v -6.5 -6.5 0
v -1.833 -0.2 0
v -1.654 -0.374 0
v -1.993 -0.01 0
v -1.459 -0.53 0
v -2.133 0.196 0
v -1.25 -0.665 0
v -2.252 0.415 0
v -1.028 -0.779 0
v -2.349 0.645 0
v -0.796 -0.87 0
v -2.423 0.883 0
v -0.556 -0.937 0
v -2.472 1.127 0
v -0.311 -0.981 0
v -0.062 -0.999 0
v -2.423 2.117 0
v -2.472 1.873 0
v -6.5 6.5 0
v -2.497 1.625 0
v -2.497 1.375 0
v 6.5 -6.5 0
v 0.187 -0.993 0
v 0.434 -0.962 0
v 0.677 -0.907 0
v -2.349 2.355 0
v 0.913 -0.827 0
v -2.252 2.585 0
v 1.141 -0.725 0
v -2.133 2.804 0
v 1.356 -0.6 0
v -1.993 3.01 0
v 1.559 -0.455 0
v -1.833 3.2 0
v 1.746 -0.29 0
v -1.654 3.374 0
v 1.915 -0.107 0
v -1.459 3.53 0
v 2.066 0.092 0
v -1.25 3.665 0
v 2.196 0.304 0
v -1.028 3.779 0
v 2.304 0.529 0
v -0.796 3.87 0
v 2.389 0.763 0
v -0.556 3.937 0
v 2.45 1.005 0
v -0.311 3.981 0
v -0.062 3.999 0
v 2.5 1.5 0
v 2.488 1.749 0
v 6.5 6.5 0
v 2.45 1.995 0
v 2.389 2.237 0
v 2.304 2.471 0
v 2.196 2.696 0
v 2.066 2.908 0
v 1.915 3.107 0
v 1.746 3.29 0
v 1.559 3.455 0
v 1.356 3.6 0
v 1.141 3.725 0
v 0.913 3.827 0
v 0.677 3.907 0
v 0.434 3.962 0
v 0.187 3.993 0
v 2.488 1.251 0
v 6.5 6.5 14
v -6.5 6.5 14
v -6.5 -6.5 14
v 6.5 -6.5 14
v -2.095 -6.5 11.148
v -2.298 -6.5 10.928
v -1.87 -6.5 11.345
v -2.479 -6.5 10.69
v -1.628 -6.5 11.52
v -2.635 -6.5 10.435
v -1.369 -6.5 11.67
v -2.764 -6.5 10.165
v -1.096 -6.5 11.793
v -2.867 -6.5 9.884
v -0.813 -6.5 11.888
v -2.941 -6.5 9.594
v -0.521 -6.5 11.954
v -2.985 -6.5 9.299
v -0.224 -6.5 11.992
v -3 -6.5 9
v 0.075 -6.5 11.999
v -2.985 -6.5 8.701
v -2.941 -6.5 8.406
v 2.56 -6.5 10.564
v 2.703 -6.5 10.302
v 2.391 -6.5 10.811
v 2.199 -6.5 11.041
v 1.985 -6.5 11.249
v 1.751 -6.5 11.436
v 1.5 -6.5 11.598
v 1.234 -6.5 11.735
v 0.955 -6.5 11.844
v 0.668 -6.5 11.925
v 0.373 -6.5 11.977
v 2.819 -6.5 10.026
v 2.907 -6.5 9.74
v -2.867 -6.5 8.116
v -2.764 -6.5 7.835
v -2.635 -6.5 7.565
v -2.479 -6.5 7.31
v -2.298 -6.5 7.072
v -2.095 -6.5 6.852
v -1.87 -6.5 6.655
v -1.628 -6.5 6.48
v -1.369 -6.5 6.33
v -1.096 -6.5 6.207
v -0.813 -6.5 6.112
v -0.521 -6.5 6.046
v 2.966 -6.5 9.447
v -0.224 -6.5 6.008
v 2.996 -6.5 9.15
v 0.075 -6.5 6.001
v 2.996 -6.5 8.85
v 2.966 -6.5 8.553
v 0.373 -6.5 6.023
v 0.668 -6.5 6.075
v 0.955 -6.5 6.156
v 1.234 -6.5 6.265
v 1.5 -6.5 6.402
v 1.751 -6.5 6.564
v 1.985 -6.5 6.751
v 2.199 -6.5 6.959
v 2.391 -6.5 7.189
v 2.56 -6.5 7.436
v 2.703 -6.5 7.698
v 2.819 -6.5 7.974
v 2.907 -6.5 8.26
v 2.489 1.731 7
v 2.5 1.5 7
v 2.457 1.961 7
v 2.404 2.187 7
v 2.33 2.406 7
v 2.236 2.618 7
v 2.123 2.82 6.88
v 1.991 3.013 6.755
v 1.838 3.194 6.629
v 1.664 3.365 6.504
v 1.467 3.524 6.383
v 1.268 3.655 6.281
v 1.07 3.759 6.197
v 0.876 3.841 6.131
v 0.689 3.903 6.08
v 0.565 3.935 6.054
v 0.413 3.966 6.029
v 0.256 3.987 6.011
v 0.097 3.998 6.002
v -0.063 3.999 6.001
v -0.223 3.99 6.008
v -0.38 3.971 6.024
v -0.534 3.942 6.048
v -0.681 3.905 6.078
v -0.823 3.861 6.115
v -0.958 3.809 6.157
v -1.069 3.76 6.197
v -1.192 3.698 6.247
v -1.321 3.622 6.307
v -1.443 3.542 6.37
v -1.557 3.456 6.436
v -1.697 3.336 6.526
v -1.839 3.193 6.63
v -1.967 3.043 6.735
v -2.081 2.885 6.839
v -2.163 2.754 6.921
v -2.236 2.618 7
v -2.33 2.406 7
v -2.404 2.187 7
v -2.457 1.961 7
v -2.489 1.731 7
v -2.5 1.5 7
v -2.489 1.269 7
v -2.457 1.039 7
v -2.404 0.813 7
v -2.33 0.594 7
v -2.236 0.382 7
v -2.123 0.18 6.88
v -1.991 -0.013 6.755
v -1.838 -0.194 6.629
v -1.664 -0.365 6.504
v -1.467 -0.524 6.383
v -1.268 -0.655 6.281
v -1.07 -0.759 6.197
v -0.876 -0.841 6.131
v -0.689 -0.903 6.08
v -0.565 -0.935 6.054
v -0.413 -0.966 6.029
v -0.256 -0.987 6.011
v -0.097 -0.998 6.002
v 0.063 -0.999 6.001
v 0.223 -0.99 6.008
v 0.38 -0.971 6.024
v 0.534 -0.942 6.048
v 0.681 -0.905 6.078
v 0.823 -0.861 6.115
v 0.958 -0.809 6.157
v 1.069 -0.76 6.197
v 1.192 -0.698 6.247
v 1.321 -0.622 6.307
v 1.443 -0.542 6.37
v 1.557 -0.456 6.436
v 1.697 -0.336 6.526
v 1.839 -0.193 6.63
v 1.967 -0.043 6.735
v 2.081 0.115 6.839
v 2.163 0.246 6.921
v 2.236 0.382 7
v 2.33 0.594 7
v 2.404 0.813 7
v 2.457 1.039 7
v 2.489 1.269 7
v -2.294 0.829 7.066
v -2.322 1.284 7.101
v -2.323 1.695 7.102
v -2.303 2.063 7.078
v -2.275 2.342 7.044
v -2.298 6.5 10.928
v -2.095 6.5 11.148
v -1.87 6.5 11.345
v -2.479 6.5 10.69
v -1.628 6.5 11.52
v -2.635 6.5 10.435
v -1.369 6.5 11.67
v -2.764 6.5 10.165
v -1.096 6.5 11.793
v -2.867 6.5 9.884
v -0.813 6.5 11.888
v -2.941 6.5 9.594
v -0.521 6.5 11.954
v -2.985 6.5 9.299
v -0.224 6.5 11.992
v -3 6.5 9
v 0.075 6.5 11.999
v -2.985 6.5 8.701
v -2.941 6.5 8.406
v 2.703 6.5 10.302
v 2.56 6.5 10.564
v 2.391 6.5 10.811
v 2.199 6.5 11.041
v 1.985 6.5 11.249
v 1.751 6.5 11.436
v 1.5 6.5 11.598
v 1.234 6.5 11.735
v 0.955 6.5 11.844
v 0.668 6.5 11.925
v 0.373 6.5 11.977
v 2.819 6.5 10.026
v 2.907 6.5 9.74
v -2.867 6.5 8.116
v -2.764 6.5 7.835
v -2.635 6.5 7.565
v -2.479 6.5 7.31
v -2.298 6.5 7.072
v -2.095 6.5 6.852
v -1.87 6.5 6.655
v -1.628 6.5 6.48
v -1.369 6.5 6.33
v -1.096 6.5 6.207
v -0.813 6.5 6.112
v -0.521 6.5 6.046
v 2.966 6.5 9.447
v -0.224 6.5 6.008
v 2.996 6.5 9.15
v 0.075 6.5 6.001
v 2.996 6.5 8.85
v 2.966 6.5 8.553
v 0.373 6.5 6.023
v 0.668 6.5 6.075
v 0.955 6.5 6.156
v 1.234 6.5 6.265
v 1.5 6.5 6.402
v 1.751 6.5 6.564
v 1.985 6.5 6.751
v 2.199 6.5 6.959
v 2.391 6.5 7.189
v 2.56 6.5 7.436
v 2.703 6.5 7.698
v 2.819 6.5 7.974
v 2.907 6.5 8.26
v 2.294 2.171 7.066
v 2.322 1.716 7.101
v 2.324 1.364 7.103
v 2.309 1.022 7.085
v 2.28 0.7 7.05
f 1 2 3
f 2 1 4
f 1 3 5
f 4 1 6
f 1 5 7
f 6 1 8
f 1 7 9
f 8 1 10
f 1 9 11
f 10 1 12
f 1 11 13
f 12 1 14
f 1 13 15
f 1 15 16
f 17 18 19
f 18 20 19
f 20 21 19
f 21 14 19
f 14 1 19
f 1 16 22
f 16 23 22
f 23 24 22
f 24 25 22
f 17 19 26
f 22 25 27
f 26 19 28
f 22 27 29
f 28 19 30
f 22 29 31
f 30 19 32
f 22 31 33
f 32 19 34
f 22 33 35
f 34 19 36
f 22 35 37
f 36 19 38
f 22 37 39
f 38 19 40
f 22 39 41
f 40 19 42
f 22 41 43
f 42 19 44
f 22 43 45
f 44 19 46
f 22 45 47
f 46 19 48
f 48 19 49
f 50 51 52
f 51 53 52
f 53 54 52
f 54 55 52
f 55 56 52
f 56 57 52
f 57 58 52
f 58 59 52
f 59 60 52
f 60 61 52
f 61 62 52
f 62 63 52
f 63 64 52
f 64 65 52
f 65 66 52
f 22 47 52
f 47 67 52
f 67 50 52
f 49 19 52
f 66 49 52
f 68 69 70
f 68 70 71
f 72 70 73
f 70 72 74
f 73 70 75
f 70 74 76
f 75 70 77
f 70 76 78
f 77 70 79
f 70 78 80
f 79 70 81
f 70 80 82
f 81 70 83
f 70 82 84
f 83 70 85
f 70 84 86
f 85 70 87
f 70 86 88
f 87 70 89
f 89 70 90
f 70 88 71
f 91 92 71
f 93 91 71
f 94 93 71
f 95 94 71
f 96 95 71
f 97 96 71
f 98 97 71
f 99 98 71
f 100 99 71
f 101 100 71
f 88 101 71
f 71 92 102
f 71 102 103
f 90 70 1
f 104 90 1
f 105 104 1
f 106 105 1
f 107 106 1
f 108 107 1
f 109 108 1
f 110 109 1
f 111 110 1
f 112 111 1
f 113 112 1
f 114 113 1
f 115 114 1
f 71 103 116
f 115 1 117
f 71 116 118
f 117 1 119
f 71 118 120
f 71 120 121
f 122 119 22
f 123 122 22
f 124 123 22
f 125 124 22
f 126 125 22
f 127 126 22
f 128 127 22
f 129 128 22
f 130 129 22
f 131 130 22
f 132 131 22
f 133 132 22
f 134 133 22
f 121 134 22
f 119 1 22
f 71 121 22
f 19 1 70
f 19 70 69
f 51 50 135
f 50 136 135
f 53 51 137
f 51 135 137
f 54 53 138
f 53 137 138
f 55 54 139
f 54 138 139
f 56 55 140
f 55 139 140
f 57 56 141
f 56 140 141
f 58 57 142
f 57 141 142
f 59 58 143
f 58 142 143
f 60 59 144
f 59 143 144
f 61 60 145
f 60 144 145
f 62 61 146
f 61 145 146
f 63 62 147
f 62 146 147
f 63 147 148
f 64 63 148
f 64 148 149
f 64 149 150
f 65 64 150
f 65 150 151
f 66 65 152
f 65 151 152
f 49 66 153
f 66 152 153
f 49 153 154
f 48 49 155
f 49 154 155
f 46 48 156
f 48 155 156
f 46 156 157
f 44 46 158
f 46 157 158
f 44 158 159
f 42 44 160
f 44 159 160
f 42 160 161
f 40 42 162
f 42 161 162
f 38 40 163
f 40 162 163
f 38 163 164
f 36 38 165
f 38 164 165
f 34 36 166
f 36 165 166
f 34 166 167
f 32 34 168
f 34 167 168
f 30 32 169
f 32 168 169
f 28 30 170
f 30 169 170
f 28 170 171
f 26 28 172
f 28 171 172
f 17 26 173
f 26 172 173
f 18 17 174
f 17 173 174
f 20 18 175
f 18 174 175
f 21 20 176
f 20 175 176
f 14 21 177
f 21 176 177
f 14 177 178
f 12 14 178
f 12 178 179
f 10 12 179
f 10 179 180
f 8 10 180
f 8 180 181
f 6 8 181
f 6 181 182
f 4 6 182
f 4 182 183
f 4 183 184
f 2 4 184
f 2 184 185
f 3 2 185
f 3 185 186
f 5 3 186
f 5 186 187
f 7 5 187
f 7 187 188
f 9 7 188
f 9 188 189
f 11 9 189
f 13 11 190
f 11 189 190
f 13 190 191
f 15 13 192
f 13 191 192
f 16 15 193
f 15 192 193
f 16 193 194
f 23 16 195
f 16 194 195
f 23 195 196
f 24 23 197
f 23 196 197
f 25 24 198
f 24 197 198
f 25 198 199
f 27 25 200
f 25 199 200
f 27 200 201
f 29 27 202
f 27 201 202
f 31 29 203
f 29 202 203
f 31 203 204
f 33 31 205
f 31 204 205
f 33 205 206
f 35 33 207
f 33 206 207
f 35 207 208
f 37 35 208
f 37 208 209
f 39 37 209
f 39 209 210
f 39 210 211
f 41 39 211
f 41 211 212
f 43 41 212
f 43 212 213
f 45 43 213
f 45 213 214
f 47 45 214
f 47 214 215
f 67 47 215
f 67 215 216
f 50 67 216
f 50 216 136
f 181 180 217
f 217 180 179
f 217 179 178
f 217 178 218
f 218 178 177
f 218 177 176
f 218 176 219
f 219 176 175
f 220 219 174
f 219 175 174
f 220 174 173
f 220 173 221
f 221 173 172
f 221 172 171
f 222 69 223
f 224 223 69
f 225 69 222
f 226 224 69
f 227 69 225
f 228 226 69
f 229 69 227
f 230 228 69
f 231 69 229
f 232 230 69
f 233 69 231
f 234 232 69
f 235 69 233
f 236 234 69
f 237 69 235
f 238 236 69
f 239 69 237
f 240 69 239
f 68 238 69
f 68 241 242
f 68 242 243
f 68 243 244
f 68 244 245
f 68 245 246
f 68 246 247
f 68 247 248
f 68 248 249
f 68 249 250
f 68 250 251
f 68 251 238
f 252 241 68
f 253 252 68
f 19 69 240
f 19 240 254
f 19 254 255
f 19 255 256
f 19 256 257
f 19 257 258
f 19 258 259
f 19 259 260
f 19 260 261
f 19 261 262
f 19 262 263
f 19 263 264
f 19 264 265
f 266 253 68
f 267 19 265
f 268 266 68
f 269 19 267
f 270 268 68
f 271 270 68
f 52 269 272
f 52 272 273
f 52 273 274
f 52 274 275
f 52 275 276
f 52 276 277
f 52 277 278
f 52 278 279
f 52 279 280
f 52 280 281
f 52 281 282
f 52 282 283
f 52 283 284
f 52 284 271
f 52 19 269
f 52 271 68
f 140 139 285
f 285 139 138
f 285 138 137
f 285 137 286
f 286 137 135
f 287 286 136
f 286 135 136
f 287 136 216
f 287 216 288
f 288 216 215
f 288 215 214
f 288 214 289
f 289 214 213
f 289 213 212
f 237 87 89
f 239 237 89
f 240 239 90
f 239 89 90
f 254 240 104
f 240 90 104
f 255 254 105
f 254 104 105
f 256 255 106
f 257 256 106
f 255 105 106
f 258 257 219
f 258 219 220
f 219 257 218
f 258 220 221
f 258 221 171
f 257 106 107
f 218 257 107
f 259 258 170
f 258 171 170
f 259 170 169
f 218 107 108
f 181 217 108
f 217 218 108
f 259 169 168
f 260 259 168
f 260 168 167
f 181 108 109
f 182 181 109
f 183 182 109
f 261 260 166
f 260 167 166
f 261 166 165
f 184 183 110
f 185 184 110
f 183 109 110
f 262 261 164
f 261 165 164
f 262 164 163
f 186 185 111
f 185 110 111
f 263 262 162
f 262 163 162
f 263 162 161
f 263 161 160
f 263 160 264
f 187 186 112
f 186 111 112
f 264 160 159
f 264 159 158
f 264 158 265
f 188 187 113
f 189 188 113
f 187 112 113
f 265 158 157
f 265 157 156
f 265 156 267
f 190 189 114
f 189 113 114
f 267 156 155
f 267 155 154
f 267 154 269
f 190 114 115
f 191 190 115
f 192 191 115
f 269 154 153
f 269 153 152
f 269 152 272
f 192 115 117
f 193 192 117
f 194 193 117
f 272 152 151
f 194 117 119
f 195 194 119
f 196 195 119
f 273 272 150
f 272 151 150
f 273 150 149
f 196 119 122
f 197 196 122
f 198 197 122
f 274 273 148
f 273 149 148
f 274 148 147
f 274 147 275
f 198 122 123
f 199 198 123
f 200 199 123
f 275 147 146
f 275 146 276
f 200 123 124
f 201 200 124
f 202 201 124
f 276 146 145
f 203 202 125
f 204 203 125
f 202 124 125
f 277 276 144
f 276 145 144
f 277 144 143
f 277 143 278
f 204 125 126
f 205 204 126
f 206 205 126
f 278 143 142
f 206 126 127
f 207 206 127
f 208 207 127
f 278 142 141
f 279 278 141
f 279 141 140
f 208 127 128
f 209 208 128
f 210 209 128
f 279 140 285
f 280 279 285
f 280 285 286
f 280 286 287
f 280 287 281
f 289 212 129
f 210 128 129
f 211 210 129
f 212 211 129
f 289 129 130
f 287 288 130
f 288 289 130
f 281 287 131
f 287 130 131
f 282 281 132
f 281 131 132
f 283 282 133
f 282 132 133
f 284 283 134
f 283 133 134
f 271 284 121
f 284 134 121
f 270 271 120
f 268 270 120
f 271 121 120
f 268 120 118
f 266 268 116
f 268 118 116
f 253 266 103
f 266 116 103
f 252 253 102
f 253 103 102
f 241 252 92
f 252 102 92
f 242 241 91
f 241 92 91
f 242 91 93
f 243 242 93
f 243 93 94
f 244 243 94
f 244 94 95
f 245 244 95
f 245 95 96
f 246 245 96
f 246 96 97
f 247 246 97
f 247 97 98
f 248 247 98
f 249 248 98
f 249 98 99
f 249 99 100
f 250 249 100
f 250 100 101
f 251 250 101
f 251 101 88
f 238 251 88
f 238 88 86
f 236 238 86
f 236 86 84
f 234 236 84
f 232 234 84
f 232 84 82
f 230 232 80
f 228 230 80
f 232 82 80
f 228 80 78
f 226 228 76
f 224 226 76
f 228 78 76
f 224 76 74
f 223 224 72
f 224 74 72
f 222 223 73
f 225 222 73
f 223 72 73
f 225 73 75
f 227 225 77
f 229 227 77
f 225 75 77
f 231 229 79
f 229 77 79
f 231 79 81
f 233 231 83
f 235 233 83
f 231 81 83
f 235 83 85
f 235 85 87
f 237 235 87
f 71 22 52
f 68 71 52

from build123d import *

# Parameters (mm, degrees)
SKETCH1_W                 = 13
SKETCH1_H                 = 13
BOSS_EXTRUDE1_DEPTH       = 14
F_6_0MM_DOWEL_HOLE1_D     = 6
F_6_0MM_DOWEL_HOLE1_DEPTH = 13
M6X1_0_TAPPED_HOLE6_D     = 5
M6X1_0_TAPPED_HOLE6_DEPTH = 7
M6X1_0_TAPPED_HOLE6_TIP   = 1.502151548


with BuildPart() as part:
    # Sketch1 → Boss-Extrude1 (new body)
    with BuildSketch(Plane.XY):
        Rectangle(SKETCH1_W, SKETCH1_H)
    extrude(amount=BOSS_EXTRUDE1_DEPTH)

    # Ø6.0mm Dowel Hole1
    with Locations(Plane(origin=(0, 6.5, 0), x_dir=(1, 0, 0), z_dir=(0, 1, 0))):
        with Locations((0, -9)):
            Hole(F_6_0MM_DOWEL_HOLE1_D / 2, depth=F_6_0MM_DOWEL_HOLE1_DEPTH)

    # M6x1.0 Tapped Hole6
    with Locations(Plane(origin=(0, 0, 0), x_dir=(-1, 0, 0), z_dir=(0, 0, -1))):
        with Locations((0, 1.5)):
            Hole(M6X1_0_TAPPED_HOLE6_D / 2, depth=M6X1_0_TAPPED_HOLE6_DEPTH)
            with Locations((0, 0, -(M6X1_0_TAPPED_HOLE6_DEPTH + M6X1_0_TAPPED_HOLE6_TIP / 2))):  # 118° drill point
                Cone(0, M6X1_0_TAPPED_HOLE6_D / 2, M6X1_0_TAPPED_HOLE6_TIP, mode=Mode.SUBTRACT)


solid = part.part
